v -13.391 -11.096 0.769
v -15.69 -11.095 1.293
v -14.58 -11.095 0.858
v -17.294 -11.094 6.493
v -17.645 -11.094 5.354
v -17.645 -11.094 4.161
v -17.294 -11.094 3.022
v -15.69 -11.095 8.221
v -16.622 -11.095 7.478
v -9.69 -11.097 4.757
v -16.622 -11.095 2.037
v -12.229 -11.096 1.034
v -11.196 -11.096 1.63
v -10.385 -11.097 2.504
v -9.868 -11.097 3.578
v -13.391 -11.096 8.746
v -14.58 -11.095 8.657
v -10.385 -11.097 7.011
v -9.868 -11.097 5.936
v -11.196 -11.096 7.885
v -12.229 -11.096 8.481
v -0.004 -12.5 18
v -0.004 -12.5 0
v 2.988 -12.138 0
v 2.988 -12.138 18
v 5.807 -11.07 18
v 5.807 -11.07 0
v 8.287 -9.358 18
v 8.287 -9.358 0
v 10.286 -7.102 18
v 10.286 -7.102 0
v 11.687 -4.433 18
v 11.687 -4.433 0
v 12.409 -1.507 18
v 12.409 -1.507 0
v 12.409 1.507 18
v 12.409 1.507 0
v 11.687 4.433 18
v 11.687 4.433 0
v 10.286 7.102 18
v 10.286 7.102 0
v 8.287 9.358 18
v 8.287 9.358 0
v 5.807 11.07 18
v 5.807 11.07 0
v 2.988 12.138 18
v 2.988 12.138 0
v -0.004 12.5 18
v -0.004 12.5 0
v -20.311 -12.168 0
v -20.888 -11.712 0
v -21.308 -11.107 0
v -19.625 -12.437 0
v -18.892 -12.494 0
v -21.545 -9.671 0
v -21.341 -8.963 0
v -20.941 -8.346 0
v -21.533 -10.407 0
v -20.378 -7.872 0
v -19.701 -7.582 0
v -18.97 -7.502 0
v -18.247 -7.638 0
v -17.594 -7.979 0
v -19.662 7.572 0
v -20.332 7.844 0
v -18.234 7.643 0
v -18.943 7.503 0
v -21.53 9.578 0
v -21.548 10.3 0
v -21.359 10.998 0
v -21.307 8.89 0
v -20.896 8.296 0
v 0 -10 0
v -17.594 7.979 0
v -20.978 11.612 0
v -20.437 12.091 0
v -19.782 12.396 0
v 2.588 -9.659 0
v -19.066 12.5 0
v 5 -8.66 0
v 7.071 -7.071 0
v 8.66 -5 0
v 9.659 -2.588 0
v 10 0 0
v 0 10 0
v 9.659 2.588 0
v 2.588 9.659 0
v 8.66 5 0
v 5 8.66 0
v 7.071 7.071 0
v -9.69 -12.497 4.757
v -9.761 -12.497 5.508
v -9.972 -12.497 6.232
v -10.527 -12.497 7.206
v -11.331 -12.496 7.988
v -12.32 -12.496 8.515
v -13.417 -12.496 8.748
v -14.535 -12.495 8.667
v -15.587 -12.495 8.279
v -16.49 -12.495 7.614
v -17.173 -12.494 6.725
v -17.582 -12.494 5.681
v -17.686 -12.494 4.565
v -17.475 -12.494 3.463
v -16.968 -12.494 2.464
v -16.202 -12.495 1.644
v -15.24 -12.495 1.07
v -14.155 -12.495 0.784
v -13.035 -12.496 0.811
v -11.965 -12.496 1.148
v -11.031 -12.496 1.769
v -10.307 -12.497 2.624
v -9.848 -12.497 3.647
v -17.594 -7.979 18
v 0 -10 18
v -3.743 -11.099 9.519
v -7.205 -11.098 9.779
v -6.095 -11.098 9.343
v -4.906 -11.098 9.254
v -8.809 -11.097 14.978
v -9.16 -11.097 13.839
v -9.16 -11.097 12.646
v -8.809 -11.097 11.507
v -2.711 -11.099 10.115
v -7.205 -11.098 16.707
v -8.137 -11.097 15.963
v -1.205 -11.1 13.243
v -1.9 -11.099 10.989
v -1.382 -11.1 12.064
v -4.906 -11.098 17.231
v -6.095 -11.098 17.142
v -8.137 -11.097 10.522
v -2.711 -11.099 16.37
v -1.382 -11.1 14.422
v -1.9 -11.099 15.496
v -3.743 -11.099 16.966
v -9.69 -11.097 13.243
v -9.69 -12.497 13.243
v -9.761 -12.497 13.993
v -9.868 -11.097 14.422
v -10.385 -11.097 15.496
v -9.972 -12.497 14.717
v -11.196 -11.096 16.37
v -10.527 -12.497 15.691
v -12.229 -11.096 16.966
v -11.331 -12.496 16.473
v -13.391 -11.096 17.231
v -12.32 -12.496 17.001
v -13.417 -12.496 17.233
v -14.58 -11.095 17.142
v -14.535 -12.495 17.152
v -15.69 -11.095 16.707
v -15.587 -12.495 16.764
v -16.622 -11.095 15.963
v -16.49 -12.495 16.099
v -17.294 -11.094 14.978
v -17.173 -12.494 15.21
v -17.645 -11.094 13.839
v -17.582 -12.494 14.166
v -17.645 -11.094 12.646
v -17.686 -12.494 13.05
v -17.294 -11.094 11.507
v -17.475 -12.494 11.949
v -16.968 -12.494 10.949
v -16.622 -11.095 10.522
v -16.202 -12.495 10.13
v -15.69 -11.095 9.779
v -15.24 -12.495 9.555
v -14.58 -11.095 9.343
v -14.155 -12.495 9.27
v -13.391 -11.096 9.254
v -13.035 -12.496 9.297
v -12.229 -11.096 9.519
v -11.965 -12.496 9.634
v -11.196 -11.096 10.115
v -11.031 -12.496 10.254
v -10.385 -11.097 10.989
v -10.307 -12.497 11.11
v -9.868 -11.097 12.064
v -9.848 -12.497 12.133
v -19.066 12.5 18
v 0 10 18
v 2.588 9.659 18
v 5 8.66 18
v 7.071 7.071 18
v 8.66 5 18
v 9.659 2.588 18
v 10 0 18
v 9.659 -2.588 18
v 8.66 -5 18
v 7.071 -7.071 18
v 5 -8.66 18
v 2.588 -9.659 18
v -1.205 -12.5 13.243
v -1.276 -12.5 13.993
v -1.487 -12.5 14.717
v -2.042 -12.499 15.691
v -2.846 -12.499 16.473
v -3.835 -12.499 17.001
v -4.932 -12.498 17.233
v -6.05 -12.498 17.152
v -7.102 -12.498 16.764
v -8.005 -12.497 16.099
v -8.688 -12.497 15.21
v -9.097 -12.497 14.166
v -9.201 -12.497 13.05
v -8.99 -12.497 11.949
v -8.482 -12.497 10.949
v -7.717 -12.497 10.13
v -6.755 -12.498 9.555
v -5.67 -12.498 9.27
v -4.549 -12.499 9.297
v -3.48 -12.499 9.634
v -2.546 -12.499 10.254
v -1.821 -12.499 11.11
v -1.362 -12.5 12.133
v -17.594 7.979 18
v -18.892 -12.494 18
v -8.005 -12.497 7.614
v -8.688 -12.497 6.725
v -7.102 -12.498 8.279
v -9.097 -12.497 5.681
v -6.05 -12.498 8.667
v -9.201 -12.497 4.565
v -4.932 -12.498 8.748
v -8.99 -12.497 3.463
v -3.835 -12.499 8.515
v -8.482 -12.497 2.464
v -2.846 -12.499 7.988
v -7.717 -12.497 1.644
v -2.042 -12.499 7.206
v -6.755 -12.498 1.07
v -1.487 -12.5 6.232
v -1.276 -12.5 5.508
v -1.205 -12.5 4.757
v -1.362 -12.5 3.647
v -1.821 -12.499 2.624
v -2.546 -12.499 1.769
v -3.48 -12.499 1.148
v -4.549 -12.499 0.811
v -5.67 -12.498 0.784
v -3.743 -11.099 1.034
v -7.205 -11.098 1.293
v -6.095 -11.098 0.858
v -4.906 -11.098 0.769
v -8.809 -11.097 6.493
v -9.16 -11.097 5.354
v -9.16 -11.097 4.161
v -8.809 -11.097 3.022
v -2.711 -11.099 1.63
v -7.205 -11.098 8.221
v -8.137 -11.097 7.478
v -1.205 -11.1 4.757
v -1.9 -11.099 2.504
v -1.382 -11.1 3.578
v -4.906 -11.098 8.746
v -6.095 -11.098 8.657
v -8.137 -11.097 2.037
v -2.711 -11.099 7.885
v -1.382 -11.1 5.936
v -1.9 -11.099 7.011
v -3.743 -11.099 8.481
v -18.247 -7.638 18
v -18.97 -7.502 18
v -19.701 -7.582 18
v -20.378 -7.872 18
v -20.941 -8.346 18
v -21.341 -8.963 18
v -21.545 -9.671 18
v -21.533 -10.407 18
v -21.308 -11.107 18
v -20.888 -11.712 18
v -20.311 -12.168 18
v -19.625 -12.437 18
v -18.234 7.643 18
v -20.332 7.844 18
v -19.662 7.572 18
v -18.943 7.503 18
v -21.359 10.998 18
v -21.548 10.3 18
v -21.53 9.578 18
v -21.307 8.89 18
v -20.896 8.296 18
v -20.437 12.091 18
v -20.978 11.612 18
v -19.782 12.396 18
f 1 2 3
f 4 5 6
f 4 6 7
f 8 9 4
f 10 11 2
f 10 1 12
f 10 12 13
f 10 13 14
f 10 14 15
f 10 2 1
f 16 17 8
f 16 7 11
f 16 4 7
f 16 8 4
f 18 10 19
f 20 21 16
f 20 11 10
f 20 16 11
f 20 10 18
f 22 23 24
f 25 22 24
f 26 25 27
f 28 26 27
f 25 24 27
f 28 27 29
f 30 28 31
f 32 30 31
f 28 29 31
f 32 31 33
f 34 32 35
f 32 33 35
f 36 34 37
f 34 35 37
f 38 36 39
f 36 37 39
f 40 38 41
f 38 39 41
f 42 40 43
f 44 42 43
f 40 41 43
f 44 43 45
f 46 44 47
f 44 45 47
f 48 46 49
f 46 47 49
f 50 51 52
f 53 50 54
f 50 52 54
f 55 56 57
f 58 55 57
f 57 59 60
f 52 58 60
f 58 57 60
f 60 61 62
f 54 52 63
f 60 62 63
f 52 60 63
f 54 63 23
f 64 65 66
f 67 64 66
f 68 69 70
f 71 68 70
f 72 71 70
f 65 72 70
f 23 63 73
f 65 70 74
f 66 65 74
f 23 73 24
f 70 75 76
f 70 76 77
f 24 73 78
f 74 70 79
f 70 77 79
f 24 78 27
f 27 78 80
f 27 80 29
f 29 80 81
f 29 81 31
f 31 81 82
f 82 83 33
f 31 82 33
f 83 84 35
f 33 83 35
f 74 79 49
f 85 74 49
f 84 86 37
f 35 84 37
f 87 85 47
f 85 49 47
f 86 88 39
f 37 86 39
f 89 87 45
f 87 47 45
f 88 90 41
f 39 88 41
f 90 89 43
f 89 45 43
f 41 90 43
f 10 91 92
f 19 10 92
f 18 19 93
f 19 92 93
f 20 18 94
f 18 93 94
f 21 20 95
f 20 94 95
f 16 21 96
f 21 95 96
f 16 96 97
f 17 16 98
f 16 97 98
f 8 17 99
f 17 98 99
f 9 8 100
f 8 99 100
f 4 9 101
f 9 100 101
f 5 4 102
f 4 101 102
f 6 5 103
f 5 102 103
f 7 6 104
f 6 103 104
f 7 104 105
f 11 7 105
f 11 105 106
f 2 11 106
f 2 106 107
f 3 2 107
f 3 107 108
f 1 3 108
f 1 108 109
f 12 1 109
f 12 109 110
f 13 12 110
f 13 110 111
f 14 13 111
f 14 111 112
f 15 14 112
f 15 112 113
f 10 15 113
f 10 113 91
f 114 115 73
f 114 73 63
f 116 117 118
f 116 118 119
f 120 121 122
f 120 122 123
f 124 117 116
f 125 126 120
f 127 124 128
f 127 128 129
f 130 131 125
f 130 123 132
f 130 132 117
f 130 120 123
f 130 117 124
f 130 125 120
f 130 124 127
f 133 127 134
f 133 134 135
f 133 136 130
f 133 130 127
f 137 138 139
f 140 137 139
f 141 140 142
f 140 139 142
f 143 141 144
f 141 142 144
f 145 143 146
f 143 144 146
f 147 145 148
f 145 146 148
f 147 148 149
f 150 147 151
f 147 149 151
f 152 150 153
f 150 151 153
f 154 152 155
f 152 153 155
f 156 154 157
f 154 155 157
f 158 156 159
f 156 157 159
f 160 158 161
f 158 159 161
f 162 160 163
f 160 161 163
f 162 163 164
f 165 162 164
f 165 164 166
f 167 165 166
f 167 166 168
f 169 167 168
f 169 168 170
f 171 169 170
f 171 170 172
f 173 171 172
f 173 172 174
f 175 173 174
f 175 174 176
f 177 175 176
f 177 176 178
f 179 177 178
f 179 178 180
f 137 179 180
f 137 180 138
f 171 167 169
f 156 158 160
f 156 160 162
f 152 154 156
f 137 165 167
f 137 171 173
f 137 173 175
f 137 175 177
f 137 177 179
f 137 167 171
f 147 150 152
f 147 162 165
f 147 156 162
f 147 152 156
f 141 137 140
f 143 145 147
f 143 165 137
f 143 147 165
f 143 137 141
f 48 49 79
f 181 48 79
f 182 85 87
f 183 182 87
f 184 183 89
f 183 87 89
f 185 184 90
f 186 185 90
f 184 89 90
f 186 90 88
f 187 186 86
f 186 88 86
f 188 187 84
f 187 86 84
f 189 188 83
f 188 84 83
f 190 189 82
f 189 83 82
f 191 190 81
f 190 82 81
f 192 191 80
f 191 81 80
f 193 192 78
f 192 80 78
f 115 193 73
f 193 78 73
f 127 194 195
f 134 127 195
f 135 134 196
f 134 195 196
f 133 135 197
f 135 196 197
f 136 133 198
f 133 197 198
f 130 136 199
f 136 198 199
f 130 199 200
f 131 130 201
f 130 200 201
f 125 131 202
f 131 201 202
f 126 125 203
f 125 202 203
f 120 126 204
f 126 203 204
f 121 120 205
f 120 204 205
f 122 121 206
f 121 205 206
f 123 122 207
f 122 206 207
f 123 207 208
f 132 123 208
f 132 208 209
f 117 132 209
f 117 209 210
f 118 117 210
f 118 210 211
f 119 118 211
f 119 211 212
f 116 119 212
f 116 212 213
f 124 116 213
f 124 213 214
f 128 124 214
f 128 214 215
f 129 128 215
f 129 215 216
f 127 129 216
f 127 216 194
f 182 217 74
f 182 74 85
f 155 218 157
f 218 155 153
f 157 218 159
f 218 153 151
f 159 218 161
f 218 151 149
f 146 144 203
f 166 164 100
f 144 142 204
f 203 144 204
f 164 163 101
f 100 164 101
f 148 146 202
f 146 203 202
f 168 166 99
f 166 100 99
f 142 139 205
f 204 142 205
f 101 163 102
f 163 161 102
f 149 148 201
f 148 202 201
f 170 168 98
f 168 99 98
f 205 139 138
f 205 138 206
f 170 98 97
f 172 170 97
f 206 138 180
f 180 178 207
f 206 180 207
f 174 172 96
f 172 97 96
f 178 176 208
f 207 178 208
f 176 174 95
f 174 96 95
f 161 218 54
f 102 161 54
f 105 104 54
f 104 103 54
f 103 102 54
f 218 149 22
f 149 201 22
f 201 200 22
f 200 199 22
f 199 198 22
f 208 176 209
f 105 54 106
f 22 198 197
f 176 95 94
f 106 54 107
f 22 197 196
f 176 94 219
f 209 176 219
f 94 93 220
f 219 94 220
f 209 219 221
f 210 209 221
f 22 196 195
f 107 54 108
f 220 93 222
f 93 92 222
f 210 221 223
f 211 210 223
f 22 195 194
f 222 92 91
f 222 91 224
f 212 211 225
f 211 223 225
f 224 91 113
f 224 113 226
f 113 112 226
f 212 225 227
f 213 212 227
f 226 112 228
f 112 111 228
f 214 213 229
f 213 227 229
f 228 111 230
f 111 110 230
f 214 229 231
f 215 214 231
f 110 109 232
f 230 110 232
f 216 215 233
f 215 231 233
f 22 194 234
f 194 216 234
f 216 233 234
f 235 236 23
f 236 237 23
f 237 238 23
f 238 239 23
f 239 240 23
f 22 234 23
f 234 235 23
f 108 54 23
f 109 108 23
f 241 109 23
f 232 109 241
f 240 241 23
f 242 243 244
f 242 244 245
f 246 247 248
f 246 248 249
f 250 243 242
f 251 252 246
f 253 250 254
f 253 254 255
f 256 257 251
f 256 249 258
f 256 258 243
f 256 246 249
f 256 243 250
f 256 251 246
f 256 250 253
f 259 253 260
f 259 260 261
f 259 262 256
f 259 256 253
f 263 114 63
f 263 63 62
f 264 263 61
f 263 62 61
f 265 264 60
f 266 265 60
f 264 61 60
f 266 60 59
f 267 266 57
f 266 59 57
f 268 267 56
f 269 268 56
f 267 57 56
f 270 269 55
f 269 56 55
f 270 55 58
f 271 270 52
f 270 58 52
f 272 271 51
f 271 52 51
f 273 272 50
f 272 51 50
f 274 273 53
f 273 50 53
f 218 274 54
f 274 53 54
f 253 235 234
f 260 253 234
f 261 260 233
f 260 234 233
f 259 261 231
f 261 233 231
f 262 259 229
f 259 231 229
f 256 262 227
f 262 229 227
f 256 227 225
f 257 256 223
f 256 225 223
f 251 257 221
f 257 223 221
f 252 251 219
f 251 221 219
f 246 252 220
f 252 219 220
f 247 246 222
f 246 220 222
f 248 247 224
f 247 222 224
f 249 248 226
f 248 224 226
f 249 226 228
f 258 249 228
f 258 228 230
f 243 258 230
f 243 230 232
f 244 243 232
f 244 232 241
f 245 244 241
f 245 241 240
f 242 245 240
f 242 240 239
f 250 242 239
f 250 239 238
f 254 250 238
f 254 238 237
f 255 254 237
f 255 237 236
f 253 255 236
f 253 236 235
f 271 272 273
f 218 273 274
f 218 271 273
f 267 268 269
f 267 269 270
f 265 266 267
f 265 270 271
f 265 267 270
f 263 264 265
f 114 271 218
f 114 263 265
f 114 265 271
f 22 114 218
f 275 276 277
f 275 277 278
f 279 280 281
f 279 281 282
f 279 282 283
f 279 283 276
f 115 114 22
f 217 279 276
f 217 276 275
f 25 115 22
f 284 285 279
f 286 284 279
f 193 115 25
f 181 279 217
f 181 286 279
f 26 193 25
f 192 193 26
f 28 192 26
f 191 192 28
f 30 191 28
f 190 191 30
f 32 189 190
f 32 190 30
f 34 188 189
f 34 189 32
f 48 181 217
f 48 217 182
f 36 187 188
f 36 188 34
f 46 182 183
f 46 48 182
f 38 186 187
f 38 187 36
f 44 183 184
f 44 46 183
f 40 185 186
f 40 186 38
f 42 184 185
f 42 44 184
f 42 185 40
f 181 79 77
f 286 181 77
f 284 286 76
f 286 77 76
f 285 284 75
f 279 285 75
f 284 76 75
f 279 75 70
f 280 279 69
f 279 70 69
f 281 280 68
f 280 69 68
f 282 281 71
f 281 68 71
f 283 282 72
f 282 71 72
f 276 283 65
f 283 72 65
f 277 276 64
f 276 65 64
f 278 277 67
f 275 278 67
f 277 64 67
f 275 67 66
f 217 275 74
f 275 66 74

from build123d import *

# Parameters (mm, degrees)
F1_DEPTH = 18
F2_R     = 4
F3_DEPTH = 1.4


with BuildPart() as f1:
    # F0 (on Top) → F1 (new body)
    with BuildSketch(Plane.XY):
        with BuildLine():
            ThreePointArc((0, 10), (10, 0), (0, -10))
            Line((0, -10), (-17.59439, -7.979329))
            ThreePointArc((-17.59439, -7.979329), (-16.838188, -8.866441), (-16.566426, -10))
            ThreePointArc((-16.566426, -10), (-17.237867, -11.704809), (-18.891523, -12.493874))
            Line((-18.891523, -12.493874), (-0.004054, -12.499999))
            ThreePointArc((-0.004054, -12.499999), (12.5, 0), (-0.004054, 12.499999))
            Line((-0.004054, 12.499999), (-19.066426, 12.5))
            ThreePointArc((-19.066426, 12.5), (-17.298659, 11.767767), (-16.566426, 10))
            ThreePointArc((-16.566426, 10), (-16.838188, 8.866441), (-17.59439, 7.979329))
            Line((-17.59439, 7.979329), (0, 10))
        make_face()
        with BuildLine():
            ThreePointArc((-16.566426, -10), (-16.838188, -8.866441), (-17.59439, -7.979329))
            ThreePointArc((-17.59439, -7.979329), (-21.469212, -9.309624), (-18.891523, -12.493874))
            ThreePointArc((-18.891523, -12.493874), (-17.237867, -11.704809), (-16.566426, -10))
        make_face()
        with BuildLine():
            ThreePointArc((-19.066426, 12.5), (-21.443575, 9.225945), (-17.59439, 7.979329))
            ThreePointArc((-17.59439, 7.979329), (-16.838188, 8.866441), (-16.566426, 10))
            ThreePointArc((-16.566426, 10), (-17.298659, 11.767767), (-19.066426, 12.5))
        make_face()
    extrude(amount=F1_DEPTH)

    # F2 (on face) → F3 (cut)
    with BuildSketch(Plane(origin=(-0.004054, -12.499999, 0), x_dir=(1, -0.000324, 0), z_dir=(-0.000324, -1, 0))):
        with Locations((-13.686376, 4.757359)):
            Circle(F2_R)
        with Locations((-13.686376, 13.242641)):
            Circle(F2_R)
        with Locations((-5.201095, 13.242641)):
            Circle(F2_R)
        with Locations((-5.201095, 4.757359)):
            Circle(F2_R)
    extrude(amount=-F3_DEPTH, mode=Mode.SUBTRACT)


solid = f1.part
